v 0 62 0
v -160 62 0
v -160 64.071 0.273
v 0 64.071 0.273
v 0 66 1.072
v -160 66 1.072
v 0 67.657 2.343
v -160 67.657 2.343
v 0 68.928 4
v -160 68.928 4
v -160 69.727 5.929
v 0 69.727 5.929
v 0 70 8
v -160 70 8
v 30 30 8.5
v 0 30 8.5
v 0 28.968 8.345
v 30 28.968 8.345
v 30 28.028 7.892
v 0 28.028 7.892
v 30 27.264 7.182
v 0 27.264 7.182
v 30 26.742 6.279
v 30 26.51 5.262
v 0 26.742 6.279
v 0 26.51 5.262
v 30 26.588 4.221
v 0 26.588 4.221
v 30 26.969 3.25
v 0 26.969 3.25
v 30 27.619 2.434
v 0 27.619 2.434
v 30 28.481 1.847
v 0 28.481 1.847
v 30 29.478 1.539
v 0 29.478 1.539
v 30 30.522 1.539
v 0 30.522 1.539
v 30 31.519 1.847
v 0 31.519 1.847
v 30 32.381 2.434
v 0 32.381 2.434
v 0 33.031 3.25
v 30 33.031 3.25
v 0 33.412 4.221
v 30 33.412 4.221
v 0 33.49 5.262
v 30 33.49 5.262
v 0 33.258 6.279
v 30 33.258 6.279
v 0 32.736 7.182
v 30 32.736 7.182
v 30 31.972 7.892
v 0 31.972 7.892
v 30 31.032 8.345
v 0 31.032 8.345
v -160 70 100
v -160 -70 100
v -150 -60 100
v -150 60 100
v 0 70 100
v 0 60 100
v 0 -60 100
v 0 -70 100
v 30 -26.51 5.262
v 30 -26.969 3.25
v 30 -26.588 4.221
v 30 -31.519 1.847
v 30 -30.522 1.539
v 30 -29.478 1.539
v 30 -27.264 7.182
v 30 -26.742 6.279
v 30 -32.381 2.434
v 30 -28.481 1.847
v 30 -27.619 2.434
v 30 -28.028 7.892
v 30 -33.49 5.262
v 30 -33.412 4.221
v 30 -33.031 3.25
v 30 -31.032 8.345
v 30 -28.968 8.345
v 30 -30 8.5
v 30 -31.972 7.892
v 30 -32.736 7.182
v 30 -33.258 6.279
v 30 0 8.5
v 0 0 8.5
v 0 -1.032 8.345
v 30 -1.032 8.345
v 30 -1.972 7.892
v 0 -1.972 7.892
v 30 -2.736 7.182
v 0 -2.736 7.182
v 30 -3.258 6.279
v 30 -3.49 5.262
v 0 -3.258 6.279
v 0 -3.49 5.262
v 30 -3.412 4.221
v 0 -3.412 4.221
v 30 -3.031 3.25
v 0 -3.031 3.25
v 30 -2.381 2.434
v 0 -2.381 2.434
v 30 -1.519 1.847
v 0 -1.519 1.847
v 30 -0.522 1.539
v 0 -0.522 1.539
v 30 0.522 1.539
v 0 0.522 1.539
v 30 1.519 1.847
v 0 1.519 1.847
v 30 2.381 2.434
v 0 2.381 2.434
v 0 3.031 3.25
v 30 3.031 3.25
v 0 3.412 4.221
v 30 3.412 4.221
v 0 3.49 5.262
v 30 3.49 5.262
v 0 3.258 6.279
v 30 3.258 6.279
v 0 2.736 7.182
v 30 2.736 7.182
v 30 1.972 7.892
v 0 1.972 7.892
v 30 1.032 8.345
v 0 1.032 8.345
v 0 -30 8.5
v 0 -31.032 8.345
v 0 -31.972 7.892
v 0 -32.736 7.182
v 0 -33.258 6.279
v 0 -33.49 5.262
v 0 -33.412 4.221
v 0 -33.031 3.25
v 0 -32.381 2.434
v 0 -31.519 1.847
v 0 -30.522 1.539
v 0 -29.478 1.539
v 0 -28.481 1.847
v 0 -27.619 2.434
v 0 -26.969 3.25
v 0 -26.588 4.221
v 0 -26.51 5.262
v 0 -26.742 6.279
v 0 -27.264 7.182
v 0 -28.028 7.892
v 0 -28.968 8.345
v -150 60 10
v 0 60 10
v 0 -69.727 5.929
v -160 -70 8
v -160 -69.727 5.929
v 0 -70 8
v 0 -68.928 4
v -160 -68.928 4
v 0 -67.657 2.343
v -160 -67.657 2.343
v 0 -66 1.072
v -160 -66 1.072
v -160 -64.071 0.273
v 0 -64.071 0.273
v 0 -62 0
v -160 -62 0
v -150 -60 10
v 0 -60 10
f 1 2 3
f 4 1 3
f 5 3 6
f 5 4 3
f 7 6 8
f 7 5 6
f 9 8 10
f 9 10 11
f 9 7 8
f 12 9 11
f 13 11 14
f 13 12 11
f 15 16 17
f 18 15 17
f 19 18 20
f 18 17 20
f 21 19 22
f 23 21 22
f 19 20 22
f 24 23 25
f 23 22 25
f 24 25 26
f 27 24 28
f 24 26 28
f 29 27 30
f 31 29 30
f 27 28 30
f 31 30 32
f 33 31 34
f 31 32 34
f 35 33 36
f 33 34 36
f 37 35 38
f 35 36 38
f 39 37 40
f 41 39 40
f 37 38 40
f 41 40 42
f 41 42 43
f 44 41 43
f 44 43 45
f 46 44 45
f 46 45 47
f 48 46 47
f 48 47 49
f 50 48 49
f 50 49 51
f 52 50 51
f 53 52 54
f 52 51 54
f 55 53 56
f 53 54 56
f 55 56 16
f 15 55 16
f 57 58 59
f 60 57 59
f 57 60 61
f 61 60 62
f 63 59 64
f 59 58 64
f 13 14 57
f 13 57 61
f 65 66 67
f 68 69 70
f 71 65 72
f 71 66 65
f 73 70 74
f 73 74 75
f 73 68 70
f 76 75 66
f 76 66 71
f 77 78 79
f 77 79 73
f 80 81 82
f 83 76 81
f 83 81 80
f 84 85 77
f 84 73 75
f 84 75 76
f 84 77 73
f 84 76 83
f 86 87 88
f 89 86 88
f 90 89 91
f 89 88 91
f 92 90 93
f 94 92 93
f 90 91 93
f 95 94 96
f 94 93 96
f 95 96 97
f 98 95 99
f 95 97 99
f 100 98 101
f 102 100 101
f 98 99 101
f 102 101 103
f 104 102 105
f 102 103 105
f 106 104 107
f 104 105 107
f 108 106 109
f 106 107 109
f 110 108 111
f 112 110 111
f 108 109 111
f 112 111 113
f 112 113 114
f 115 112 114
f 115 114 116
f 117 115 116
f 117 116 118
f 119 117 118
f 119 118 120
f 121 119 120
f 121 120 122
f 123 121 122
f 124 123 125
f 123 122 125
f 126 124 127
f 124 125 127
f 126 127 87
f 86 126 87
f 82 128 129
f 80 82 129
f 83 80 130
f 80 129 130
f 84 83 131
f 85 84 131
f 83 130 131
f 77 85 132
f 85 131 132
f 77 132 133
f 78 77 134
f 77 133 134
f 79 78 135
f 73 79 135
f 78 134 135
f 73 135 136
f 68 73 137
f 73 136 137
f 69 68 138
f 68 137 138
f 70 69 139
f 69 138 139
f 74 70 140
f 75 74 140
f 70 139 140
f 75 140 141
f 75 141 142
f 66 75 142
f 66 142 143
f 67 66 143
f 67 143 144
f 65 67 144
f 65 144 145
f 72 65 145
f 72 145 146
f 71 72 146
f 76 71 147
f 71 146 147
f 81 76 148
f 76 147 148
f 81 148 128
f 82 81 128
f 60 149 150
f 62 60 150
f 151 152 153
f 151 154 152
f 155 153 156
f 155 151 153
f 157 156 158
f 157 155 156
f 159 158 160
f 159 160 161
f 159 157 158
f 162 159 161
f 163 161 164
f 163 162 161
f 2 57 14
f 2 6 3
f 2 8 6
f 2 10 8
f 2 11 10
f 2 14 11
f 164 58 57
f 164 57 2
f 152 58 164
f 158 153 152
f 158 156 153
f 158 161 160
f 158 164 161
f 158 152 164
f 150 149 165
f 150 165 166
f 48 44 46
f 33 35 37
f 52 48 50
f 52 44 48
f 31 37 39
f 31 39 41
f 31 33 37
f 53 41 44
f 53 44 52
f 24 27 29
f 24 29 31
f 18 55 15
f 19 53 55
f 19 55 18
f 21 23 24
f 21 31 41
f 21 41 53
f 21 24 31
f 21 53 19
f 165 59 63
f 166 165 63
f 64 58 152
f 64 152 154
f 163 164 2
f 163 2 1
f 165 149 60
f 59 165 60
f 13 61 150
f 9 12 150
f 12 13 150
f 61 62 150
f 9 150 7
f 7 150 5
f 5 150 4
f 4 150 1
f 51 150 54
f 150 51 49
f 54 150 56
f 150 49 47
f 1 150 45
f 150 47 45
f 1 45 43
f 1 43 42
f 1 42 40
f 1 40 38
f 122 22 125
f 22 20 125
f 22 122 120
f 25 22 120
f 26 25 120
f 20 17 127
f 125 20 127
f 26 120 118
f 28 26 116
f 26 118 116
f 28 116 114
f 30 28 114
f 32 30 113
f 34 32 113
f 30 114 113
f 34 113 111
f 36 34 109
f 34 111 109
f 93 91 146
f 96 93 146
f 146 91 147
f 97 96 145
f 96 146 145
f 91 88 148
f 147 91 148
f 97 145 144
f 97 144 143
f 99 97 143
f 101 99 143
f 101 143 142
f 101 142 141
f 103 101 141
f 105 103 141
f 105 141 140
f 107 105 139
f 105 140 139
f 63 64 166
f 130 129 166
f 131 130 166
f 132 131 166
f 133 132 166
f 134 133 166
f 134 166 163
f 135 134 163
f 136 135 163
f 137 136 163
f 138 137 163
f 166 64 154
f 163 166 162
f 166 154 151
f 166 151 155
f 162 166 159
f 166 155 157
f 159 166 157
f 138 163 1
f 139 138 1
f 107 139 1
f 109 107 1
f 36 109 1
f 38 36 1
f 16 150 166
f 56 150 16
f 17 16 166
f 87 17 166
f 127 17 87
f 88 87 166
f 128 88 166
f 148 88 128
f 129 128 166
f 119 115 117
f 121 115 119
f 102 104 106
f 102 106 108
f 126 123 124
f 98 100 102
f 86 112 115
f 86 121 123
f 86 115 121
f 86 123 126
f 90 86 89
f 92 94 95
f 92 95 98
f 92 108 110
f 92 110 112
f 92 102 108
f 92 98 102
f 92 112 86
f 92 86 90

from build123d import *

# Parameters (mm, degrees)
SKETCH1_W               = 150
SKETCH1_H               = 120
BOSS_EXTRUDE1_DEPTH     = 10
SKETCH2_R               = 3.5
BOSS_EXTRUDE2_DEPTH     = 30
CROQUIS2_W              = 100
CROQUIS2_H              = 120
SALIENTE_EXTRUIR1_DEPTH = 10
CROQUIS3_W              = 160
CROQUIS3_H              = 100
SALIENTE_EXTRUIR2_DEPTH = 10
CROQUIS4_W              = 160
CROQUIS4_H              = 100
SALIENTE_EXTRUIR3_DEPTH = 10
FILLET1_R               = 8


with BuildPart() as part:
    # Sketch1 → Boss-Extrude1 (new body)
    with BuildSketch(Plane.XY):
        with Locations((-75, 0)):
            Rectangle(SKETCH1_W, SKETCH1_H)
    extrude(amount=BOSS_EXTRUDE1_DEPTH)

    # Sketch2 → Boss-Extrude2 (add)
    with BuildSketch(Plane(origin=(0, 0, 0), x_dir=(0, 0, -1), z_dir=(1, 0, 0))):
        with Locations(Location((-5, 30, 0), (0, 0, 180))):
            Circle(SKETCH2_R)
        with Locations(Location((-5, -30, 0), (0, 0, 180))):
            Circle(SKETCH2_R)
        with Locations(Location((-5, 0, 0), (0, 0, 180))):
            Circle(SKETCH2_R)
    extrude(amount=BOSS_EXTRUDE2_DEPTH)

    # Croquis2 → Saliente-Extruir1 (add)
    with BuildSketch(Plane.ZY.offset(150)):
        with Locations((50, 0)):
            Rectangle(CROQUIS2_W, CROQUIS2_H)
    extrude(amount=SALIENTE_EXTRUIR1_DEPTH)

    # Croquis3 → Saliente-Extruir2 (add)
    with BuildSketch(Plane.XZ.offset(60)):
        with Locations((-80, 50)):
            Rectangle(CROQUIS3_W, CROQUIS3_H)
    extrude(amount=SALIENTE_EXTRUIR2_DEPTH)

    # Croquis4 → Saliente-Extruir3 (add)
    with BuildSketch(Plane(origin=(0, 60, 0), x_dir=(1, 0, 0), z_dir=(0, 1, 0))):
        with Locations((-80, -50)):
            Rectangle(CROQUIS4_W, CROQUIS4_H)
    extrude(amount=SALIENTE_EXTRUIR3_DEPTH)

    # Fillet1
    fillet1_edges = [part.edges().sort_by_distance(p)[0] for p in [
        (-80, -70, 0),
        (-80, 70, 0),
    ]]
    fillet(fillet1_edges, radius=FILLET1_R)


solid = part.part
